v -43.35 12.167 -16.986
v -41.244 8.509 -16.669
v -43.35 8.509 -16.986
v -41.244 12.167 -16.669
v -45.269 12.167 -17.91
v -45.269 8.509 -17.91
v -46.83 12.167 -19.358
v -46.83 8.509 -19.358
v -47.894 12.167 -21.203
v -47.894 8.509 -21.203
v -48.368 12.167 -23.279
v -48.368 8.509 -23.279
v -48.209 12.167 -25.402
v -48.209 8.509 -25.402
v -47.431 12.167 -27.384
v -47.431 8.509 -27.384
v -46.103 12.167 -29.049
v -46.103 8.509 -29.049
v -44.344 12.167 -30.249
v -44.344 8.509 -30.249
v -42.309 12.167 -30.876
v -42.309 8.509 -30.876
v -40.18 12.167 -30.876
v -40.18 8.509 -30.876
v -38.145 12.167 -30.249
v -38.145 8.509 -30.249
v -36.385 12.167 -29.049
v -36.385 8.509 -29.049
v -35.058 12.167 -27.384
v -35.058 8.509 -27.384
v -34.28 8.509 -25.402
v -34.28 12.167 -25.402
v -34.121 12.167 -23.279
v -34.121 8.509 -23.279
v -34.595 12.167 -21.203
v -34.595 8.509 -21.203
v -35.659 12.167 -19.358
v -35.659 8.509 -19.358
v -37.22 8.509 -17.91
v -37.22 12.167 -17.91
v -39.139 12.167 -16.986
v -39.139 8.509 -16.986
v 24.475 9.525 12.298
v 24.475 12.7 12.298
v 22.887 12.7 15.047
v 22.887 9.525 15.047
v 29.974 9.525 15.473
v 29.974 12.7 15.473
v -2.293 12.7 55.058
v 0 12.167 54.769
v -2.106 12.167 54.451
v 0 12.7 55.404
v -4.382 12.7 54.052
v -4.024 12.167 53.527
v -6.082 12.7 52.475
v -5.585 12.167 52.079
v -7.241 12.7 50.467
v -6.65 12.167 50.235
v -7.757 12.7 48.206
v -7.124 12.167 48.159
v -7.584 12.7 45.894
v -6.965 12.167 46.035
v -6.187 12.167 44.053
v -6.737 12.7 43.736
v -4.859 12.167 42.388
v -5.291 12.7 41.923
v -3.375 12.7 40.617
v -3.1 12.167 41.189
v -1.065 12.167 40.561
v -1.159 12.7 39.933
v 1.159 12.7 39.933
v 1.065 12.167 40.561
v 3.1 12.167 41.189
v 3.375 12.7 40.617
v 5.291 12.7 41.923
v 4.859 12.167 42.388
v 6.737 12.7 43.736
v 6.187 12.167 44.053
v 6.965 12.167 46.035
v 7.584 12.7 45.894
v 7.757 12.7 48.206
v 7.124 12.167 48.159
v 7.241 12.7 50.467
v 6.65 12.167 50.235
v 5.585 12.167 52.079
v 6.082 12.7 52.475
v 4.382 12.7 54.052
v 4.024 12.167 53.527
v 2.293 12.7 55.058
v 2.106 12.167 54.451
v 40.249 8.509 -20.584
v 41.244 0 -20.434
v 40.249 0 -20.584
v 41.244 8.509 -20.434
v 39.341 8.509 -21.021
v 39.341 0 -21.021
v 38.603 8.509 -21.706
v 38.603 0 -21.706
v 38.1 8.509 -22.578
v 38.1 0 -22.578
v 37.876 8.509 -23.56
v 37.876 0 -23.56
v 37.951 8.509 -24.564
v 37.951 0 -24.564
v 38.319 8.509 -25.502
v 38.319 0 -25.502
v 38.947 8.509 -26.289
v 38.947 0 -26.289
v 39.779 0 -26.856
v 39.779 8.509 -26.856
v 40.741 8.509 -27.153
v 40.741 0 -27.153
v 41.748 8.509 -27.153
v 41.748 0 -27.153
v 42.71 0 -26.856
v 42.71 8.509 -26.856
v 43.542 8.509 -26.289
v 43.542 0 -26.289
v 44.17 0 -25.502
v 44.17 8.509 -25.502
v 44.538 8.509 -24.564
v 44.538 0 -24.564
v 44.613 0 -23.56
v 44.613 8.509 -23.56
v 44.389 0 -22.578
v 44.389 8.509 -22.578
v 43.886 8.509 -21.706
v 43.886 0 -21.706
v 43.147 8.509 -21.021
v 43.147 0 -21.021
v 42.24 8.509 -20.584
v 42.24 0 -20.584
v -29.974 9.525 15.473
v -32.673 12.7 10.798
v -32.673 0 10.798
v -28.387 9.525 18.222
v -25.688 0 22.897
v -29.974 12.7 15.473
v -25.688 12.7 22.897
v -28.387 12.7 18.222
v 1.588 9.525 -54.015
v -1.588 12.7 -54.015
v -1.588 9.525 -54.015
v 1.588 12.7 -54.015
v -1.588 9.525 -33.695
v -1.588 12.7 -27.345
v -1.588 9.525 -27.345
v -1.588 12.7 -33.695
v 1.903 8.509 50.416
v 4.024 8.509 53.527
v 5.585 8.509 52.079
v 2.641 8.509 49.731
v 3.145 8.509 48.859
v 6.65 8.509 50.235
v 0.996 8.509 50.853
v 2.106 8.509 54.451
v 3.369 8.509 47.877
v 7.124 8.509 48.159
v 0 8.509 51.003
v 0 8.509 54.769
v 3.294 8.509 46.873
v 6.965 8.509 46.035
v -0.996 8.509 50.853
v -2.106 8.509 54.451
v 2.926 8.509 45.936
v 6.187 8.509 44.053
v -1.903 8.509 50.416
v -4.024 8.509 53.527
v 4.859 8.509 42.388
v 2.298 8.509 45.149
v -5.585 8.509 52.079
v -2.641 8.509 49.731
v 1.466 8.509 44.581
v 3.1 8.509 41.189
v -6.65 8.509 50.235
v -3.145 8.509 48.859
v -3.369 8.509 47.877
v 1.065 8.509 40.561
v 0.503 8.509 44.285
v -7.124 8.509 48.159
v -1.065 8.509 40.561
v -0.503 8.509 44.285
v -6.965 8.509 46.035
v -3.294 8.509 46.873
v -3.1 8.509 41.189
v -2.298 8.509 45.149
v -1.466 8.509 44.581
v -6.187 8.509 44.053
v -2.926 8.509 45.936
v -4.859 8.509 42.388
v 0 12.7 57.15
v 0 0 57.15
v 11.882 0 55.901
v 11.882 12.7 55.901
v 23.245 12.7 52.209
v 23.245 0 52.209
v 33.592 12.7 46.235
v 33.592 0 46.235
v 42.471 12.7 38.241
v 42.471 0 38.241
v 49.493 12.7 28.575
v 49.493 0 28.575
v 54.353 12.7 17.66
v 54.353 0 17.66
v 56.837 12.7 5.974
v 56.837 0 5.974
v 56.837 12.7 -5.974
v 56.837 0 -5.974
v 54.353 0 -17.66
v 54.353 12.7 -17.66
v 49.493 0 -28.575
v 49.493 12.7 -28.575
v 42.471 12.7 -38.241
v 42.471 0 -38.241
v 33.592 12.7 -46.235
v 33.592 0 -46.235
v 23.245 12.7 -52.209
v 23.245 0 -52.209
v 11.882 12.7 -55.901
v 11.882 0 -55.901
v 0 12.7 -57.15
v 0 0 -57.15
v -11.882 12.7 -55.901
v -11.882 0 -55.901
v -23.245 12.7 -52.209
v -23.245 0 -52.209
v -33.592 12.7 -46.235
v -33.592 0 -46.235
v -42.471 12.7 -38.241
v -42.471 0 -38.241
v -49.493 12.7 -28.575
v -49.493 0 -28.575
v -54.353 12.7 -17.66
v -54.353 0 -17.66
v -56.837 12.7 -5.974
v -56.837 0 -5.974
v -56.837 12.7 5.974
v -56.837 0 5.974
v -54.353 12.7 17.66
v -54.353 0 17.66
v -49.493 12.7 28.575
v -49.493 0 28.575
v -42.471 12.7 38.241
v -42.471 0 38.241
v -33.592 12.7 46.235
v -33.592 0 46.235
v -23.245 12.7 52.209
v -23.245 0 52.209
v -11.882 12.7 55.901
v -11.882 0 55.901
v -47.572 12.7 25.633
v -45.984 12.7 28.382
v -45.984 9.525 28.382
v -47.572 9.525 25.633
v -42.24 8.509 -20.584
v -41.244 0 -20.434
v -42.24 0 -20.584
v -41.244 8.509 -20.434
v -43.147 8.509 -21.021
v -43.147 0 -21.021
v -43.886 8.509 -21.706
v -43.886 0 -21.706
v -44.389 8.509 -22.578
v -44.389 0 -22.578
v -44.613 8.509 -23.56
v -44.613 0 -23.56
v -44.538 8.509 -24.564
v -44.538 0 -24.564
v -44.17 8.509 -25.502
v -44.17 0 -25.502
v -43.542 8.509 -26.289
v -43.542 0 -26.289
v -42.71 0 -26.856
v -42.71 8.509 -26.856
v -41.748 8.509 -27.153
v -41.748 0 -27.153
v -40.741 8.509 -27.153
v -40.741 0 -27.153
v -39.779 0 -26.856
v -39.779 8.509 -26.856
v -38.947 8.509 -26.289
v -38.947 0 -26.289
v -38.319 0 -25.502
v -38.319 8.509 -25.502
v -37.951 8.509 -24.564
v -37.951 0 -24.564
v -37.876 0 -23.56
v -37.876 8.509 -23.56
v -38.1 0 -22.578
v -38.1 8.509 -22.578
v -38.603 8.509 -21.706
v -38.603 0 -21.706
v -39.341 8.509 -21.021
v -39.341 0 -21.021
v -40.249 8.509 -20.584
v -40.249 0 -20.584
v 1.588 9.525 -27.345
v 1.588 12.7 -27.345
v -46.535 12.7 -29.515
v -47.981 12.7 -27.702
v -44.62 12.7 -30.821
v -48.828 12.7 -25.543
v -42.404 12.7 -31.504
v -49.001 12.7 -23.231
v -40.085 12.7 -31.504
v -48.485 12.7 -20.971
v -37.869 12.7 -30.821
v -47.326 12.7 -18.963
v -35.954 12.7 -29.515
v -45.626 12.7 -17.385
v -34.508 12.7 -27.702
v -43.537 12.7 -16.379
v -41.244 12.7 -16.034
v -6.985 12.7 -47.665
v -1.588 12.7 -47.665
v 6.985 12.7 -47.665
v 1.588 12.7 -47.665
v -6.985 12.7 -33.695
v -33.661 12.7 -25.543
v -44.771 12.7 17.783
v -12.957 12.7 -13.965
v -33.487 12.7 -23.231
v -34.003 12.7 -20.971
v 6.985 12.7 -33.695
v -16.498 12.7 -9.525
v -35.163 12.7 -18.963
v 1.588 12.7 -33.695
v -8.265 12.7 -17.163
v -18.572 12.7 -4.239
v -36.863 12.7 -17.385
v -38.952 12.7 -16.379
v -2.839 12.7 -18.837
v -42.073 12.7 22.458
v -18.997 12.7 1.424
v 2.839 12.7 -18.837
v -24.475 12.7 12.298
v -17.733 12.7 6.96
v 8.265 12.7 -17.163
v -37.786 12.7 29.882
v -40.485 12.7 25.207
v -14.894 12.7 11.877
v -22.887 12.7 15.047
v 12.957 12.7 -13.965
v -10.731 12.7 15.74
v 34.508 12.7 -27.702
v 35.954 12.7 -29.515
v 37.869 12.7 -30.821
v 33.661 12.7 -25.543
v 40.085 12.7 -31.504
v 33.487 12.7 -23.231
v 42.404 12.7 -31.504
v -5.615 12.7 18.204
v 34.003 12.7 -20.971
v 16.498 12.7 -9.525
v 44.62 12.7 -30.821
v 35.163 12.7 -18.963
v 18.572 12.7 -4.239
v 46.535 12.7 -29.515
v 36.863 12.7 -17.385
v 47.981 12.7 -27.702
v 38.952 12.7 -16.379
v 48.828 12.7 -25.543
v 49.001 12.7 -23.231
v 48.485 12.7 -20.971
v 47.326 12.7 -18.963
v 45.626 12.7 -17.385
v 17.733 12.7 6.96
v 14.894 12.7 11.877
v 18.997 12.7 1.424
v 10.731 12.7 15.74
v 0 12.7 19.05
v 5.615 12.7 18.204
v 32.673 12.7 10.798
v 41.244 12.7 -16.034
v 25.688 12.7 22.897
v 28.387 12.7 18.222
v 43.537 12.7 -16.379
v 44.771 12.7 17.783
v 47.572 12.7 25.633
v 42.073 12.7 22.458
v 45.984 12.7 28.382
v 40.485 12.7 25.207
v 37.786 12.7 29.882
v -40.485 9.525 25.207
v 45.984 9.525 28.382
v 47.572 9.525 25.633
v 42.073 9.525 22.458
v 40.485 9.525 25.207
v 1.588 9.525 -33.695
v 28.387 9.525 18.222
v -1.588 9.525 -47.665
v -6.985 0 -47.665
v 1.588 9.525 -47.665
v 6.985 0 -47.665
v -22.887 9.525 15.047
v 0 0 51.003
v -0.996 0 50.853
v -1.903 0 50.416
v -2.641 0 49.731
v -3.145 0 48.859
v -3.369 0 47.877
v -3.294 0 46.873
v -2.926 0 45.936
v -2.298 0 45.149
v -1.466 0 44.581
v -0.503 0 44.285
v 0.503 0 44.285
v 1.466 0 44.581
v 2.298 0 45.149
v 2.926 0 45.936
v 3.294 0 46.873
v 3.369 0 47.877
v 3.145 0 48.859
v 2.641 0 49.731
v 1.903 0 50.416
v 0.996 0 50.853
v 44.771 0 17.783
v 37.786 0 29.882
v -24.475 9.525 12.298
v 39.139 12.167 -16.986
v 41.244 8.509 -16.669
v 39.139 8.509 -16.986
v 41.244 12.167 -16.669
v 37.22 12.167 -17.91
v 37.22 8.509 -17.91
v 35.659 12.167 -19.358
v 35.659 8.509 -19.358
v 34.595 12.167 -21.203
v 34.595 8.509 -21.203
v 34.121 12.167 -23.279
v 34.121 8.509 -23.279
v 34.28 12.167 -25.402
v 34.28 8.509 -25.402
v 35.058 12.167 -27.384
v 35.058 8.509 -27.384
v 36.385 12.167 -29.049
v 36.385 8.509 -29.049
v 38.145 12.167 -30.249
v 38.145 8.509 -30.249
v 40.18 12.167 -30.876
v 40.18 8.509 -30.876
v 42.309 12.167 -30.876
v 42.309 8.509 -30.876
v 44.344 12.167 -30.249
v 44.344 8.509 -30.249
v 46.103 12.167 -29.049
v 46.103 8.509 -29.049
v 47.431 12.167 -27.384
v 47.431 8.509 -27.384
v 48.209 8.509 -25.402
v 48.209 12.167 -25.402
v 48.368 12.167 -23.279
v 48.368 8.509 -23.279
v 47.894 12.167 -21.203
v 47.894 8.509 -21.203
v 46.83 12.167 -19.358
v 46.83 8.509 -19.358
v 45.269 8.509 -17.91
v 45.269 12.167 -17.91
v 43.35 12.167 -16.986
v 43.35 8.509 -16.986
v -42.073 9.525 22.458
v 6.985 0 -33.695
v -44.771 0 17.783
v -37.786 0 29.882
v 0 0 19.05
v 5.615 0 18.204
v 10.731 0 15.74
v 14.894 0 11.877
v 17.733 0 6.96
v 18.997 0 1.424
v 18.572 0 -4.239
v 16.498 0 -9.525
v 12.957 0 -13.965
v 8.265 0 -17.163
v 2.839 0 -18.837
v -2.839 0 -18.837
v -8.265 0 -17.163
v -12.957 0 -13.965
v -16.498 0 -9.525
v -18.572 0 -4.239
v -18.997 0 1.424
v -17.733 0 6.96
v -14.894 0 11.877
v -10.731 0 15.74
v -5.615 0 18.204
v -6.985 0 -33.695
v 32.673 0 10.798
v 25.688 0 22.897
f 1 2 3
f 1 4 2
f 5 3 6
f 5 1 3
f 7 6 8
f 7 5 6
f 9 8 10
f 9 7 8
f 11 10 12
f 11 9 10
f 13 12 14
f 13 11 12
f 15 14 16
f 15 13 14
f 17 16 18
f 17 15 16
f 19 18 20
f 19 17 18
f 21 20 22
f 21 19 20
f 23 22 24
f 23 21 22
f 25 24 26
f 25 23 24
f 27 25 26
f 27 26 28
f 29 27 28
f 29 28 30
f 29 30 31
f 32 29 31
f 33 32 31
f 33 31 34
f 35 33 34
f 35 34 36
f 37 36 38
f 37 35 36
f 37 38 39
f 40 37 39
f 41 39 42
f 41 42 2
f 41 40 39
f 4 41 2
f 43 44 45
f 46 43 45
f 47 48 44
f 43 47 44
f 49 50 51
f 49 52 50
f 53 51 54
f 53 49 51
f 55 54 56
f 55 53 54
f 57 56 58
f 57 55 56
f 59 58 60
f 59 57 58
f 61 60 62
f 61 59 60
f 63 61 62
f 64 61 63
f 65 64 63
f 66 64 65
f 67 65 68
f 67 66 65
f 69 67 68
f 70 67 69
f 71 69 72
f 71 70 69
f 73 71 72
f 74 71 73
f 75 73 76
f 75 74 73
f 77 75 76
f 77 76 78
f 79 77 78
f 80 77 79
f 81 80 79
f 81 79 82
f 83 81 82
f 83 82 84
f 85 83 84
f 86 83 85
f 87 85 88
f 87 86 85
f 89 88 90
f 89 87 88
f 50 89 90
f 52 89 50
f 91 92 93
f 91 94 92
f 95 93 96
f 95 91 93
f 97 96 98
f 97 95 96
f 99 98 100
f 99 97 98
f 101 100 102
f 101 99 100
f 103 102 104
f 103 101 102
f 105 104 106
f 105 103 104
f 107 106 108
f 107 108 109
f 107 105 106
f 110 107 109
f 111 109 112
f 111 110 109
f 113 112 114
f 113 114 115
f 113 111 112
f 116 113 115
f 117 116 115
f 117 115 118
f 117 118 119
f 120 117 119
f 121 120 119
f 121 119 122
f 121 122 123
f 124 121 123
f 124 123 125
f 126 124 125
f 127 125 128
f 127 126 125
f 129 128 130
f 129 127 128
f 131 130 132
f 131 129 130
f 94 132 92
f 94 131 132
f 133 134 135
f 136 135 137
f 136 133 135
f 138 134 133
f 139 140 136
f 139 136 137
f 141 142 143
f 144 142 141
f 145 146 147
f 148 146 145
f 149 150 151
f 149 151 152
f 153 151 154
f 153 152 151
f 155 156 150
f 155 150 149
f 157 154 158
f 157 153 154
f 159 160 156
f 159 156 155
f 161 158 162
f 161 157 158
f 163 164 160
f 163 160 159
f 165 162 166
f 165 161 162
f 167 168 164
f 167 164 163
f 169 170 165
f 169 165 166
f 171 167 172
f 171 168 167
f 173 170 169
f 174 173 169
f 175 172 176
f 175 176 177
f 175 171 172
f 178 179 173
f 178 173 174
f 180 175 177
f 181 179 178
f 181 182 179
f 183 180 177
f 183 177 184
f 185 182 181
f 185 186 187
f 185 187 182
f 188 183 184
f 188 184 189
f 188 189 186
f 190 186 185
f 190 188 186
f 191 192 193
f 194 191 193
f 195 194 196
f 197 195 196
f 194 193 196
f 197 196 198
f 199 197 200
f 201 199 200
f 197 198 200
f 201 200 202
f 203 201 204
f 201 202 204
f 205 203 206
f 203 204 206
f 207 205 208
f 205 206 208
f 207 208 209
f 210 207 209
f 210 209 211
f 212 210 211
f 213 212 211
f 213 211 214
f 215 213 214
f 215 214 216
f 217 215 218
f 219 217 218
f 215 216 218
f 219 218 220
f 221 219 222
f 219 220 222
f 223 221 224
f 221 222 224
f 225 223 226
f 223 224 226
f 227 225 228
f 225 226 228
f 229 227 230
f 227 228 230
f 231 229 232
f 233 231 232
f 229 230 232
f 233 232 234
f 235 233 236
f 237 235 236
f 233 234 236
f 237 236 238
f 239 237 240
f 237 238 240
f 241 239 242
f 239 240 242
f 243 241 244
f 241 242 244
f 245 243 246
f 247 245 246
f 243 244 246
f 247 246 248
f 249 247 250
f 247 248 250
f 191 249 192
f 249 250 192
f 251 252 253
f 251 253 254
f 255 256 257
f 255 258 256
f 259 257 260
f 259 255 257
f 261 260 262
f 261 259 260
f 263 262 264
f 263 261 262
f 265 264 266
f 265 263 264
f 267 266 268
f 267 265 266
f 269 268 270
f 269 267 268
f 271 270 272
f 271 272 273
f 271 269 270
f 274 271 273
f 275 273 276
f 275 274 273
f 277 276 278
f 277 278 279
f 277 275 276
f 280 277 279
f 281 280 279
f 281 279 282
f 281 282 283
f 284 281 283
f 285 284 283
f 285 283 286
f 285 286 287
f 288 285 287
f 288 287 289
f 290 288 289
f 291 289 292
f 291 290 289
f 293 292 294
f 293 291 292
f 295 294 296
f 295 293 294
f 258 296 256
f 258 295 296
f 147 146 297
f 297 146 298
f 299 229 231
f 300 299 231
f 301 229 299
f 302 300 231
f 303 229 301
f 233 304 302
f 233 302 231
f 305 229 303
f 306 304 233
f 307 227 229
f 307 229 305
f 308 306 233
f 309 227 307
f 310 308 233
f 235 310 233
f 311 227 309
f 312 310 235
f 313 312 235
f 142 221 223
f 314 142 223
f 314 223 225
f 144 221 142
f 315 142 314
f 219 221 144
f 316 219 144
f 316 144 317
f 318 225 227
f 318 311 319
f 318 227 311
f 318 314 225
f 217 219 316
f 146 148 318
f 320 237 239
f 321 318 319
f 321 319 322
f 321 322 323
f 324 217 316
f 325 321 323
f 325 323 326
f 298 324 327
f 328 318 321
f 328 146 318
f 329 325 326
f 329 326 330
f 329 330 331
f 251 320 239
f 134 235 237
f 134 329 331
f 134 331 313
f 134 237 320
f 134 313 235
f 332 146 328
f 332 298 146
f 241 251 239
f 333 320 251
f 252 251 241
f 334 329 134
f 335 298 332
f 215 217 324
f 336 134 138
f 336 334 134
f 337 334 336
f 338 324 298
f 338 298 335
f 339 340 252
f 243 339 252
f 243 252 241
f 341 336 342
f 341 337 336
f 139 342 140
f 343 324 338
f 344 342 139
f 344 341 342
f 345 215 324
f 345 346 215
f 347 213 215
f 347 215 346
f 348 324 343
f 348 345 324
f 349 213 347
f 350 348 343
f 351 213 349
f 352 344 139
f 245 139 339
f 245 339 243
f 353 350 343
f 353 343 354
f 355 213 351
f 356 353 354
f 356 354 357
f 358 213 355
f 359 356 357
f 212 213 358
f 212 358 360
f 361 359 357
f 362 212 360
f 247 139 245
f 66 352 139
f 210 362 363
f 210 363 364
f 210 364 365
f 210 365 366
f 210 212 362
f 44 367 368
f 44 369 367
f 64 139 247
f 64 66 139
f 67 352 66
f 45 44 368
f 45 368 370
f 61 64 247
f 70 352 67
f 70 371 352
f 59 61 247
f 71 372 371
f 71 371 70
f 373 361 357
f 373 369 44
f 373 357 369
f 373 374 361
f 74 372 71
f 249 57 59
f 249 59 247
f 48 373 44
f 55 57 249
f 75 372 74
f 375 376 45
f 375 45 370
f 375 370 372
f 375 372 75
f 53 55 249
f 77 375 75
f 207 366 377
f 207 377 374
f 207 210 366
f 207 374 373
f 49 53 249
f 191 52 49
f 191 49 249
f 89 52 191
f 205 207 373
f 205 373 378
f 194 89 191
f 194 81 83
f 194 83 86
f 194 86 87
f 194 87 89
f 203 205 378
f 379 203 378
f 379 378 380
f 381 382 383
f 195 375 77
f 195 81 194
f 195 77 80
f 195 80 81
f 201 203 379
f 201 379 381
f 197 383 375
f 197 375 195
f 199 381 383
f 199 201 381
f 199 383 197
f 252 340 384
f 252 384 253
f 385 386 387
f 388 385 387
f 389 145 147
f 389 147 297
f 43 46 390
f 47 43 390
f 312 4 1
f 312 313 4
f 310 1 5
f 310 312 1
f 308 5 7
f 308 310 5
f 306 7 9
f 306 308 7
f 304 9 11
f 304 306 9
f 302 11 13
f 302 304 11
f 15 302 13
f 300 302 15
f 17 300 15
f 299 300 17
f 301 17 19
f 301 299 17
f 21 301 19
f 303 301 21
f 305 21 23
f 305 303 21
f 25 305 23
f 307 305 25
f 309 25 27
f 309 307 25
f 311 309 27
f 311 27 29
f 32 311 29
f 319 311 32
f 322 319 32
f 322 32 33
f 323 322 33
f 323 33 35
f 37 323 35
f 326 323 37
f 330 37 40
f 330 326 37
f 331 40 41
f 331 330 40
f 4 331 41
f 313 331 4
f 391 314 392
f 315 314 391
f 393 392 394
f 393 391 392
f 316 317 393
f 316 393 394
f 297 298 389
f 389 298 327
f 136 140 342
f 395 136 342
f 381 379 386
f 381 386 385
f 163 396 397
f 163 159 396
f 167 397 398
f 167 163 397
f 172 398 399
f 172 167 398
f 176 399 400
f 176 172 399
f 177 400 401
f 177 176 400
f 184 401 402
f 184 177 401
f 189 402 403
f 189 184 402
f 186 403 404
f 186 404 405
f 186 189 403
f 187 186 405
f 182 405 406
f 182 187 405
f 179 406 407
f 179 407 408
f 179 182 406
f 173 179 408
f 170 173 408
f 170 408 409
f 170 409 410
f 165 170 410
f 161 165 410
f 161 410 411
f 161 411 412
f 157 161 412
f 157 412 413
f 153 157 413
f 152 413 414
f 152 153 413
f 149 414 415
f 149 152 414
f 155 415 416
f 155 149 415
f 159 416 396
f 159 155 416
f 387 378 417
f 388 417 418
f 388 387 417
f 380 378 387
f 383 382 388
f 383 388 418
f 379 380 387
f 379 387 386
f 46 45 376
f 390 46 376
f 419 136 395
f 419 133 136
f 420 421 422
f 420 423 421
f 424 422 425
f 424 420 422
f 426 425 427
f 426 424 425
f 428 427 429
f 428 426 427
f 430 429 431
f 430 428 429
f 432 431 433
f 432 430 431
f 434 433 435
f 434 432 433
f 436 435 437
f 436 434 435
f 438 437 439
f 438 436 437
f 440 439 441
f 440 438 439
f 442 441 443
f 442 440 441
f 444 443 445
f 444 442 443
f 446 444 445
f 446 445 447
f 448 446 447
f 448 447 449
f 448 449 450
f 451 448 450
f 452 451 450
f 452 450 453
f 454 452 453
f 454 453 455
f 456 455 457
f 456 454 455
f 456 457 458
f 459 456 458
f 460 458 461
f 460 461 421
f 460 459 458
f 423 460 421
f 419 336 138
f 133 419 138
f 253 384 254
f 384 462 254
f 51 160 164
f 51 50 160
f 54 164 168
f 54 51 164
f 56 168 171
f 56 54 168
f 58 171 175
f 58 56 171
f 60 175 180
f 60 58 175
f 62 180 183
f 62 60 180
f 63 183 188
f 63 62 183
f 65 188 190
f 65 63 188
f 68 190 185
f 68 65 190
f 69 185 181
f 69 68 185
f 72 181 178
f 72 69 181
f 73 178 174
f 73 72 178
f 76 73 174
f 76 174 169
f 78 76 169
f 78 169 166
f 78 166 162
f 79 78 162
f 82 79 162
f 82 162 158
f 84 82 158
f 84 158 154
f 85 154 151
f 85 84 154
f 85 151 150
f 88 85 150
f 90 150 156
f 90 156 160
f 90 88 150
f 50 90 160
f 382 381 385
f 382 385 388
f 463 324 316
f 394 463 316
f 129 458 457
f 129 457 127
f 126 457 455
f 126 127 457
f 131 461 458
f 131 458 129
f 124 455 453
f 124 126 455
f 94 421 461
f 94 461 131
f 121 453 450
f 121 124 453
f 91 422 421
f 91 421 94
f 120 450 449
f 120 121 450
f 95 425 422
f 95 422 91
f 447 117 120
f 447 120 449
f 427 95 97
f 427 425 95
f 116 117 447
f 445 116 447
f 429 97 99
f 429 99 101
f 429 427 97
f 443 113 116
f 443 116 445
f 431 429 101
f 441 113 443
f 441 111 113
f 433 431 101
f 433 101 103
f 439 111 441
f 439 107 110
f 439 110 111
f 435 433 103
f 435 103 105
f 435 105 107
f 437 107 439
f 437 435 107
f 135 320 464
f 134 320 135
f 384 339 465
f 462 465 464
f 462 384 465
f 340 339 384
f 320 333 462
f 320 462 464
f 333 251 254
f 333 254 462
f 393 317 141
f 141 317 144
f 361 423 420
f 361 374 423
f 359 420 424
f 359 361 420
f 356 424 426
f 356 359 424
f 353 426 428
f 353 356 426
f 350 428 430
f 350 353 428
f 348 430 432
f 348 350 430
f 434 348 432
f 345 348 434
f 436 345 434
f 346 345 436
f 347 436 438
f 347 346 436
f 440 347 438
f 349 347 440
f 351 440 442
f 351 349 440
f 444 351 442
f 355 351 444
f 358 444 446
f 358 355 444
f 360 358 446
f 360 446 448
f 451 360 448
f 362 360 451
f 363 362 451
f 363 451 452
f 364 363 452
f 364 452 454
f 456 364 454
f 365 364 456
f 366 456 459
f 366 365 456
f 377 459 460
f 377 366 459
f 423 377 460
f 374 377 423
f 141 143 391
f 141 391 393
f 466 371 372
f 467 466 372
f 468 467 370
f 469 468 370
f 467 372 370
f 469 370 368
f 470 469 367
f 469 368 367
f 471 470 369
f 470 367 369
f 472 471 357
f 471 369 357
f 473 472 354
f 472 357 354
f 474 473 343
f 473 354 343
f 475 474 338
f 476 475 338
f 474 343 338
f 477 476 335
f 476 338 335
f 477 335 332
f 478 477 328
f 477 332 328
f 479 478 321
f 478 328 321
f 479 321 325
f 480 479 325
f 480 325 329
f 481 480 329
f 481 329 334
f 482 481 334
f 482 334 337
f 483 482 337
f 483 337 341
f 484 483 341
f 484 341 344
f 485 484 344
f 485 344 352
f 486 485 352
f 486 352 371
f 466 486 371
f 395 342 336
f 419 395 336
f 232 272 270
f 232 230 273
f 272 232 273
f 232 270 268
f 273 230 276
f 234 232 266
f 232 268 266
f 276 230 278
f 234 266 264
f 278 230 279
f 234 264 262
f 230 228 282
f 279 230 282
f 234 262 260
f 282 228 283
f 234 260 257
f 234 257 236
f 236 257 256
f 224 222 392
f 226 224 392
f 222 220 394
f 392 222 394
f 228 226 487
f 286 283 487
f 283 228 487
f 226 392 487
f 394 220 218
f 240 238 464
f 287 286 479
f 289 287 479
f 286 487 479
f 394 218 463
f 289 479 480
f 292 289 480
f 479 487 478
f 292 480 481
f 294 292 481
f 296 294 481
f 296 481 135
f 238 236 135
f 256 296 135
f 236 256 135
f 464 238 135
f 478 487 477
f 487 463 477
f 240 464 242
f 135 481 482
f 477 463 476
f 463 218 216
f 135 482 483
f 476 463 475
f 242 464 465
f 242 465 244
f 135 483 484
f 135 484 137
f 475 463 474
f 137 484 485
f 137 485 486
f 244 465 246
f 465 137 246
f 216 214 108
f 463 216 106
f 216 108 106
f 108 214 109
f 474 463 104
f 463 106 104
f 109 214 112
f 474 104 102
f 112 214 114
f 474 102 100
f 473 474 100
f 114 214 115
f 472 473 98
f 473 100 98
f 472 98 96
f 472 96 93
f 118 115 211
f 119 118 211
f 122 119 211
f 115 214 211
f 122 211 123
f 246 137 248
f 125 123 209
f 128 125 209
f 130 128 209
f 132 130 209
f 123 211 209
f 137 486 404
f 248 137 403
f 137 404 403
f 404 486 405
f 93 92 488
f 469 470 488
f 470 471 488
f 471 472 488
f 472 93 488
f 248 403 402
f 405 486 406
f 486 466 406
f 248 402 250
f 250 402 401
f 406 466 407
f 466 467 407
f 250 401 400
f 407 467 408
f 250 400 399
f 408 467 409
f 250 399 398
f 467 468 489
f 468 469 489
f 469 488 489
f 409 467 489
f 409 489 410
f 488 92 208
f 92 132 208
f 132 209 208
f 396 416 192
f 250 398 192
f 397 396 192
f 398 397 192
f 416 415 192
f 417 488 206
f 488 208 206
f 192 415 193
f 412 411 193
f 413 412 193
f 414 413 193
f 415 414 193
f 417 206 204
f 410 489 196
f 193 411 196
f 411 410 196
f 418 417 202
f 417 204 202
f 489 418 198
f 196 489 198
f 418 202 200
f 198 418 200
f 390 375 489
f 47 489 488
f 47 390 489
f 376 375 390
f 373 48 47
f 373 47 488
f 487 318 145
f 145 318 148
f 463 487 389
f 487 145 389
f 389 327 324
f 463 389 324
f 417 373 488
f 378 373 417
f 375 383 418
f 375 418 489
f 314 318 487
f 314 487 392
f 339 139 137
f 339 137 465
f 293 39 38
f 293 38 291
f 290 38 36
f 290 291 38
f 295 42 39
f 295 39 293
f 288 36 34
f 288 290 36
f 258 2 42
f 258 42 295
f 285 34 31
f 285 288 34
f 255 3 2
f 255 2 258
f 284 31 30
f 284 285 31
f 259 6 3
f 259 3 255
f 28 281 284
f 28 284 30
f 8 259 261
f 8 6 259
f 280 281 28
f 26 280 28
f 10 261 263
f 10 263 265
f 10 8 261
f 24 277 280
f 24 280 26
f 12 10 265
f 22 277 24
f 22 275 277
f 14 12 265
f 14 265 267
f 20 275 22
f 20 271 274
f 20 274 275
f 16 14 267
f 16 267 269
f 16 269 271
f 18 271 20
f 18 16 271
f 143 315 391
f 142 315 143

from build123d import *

# Parameters (mm, degrees)
SKETCH1_R                                    = 57.15
BOSS_EXTRUDE1_DEPTH                          = 12.7
SKETCH2_R                                    = 19.05
CUT_EXTRUDE1_DEPTH                           = 76.2
CBORE_FOR_1_4_BINDING_HEAD_MACHINE_S_2_COUNT = 2
CBORE_FOR_1_4_BINDING_HEAD_MACHINE_S_2_PITCH = 82.48891971
CBORE_FOR_1_4_BINDING_HEAD_MACHINE_S_3_COUNT = 2
CBORE_FOR_1_4_BINDING_HEAD_MACHINE_S_3_PITCH = 82.48891971
SKETCH5_W                                    = 13.97
SKETCH5_H                                    = 13.97
CUT_EXTRUDE2_DEPTH                           = 12.7
SKETCH7_W                                    = 3.175
SKETCH7_H                                    = 6.35
CUT_EXTRUDE4_DEPTH                           = 3.175


with BuildPart() as part:
    # Sketch1 → Boss-Extrude1 (new body)
    with BuildSketch(Plane(origin=(0, 0, 0), x_dir=(1, 0, 0), z_dir=(0, 1, 0))):
        with Locations(Location((0, 0, 0), (0, 0, 270))):
            Circle(SKETCH1_R)
    extrude(amount=BOSS_EXTRUDE1_DEPTH)

    # Sketch2 → Cut-Extrude1 (cut)
    with BuildSketch(Plane(origin=(0, 12.7, 0), x_dir=(1, 0, 0), z_dir=(0, 1, 0))):
        with Locations(Location((0, 0, 0), (0, 0, 270))):
            Circle(SKETCH2_R)
    extrude(amount=-CUT_EXTRUDE1_DEPTH, mode=Mode.SUBTRACT)

    # Sketch4 → CBORE for 1/4 Binding Head Machine Screw1 (revolve, cut)
    with BuildSketch(Plane(origin=(-41.244459855, 12.7, -23.8125), x_dir=(0, 0, 1), z_dir=(1, 0, 0))):
        Polygon((0, 0), (0, 12.7), (3.3782, 12.7), (3.3782, 4.191), (7.14375, 4.191), (7.14375, 0.532828266), (7.77875, 0), align=None)
    cbore_for_1_4_binding_head_machine_screw = revolve(axis=Axis((-41.244459855, 19.05, -23.8125), (0, -1, 0)), mode=Mode.SUBTRACT)

    # CBORE for 1_4 Binding Head Machine S 2: CBORE for 1/4 Binding Head Machine Screw1 ×2
    with Locations(*[(i * CBORE_FOR_1_4_BINDING_HEAD_MACHINE_S_2_PITCH, 0, 0) for i in range(1, CBORE_FOR_1_4_BINDING_HEAD_MACHINE_S_2_COUNT)]):
        add(cbore_for_1_4_binding_head_machine_screw, mode=Mode.SUBTRACT)

    # CBORE for 1_4 Binding Head Machine S 3: CBORE for 1/4 Binding Head Machine Screw1 ×2
    with Locations(*[Vector(0.4999999999999999, 0, 0.8660254037844388) * (i * CBORE_FOR_1_4_BINDING_HEAD_MACHINE_S_3_PITCH) for i in range(1, CBORE_FOR_1_4_BINDING_HEAD_MACHINE_S_3_COUNT)]):
        add(cbore_for_1_4_binding_head_machine_screw, mode=Mode.SUBTRACT)

    # Sketch5 → Cut-Extrude2 (cut)
    with BuildSketch(Plane(origin=(0, 12.7, 0), x_dir=(1, 0, 0), z_dir=(0, 1, 0))):
        Polygon((-44.771313472, -17.783146625), (-32.672938582, -10.798146625), (-25.687938582, -22.896521516), (-37.786313472, -29.881521516), align=None)
        Polygon((32.672938582, -10.798146625), (44.771313472, -17.783146625), (37.786313472, -29.881521516), (25.687938582, -22.896521516), align=None)
        with Locations((0, 40.67966814)):
            Rectangle(SKETCH5_W, SKETCH5_H)
    extrude(amount=-CUT_EXTRUDE2_DEPTH, mode=Mode.SUBTRACT)

    # Sketch7 → Cut-Extrude4 (cut)
    with BuildSketch(Plane(origin=(0, 12.7, 0), x_dir=(1, 0, 0), z_dir=(0, 1, 0))):
        with Locations((0, 50.83966814)):
            Rectangle(SKETCH7_W, SKETCH7_H)
        with Locations((0, 30.51966814)):
            Rectangle(SKETCH7_W, SKETCH7_H)
        Polygon((42.072563472, -22.457518742), (47.571824786, -25.632518742), (45.984324786, -28.382149399), (40.485063472, -25.207149399), align=None)
        Polygon((29.974188582, -15.472518742), (24.474927268, -12.297518742), (22.887427268, -15.047149399), (28.386688582, -18.222149399), align=None)
        Polygon((-40.485063472, -25.207149399), (-45.984324786, -28.382149399), (-47.571824786, -25.632518742), (-42.072563472, -22.457518742), align=None)
        Polygon((-28.386688582, -18.222149399), (-22.887427268, -15.047149399), (-24.474927268, -12.297518742), (-29.974188582, -15.472518742), align=None)
    extrude(amount=-CUT_EXTRUDE4_DEPTH, mode=Mode.SUBTRACT)


solid = part.part
